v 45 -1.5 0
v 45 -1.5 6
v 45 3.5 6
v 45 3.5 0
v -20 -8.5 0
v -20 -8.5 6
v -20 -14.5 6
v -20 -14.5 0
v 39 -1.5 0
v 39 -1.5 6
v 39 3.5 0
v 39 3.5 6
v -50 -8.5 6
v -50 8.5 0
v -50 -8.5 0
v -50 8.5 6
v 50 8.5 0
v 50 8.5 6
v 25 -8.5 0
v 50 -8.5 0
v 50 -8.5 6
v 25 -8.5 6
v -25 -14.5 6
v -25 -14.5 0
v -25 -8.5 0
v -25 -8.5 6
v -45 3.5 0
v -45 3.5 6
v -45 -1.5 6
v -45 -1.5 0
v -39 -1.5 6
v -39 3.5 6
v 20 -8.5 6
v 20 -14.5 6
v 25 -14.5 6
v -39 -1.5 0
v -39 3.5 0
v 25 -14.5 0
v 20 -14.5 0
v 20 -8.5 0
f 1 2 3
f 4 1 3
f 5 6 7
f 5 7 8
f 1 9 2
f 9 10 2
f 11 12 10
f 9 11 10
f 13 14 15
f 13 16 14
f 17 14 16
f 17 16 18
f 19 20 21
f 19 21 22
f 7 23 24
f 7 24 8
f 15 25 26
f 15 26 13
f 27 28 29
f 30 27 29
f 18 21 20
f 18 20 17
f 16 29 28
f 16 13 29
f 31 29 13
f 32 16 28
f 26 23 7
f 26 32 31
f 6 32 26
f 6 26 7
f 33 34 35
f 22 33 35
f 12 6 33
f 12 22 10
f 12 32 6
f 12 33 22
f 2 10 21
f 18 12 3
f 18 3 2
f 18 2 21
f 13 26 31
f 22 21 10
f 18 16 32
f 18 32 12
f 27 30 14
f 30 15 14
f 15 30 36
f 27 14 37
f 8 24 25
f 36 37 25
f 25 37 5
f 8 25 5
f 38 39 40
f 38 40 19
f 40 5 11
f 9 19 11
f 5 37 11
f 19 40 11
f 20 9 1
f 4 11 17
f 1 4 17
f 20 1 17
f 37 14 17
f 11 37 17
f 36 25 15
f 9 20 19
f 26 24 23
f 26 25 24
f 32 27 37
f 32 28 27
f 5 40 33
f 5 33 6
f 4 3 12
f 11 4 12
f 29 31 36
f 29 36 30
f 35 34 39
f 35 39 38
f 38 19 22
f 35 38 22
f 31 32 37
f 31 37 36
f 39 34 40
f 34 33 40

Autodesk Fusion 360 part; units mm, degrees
sketch "Sketch1" plane through (0, 0, 0) normal (0, 0, 1) x (1, 0, 0)
  line L0 (-45, 8.5) -> (45, 8.5)
  line L1 (45, 8.5) -> (45, -8.5)
  line L2 (45, -8.5) -> (-45, -8.5)
  line L3 (-45, -8.5) -> (-45, 8.5)
  line L4 (-45, 8.5) -> (45, -8.5) construction
  line L5 (45, 8.5) -> (-45, -8.5) construction
  dimension "d1" = 90
  dimension "d2" = 17
extrude "Extrude1" add sketch "Sketch1" along normal blind 6
sketch "Sketch2" plane through (0, 0, 6) normal (0, 0, 1) x (-1, 0, 0)
  line L0 (45, 8.5) -> (-45, 8.5)
  line L1 (-45, 8.5) -> (-45, -8.5)
  line L2 (-45, -8.5) -> (45, -8.5)
  line L3 (45, -8.5) -> (45, 8.5)
  line L4 (45, -8.5) -> (39, -8.5) construction
  line L5 (39, -8.5) -> (39, -3.5) construction
  line L6 (39, -3.5) -> (45, -3.5) construction
  line L7 (45, -3.5) -> (45, -8.5) construction
  line L8 (-45, -8.5) -> (-39, -8.5) construction
  line L9 (-39, -8.5) -> (-39, -3.5) construction
  line L10 (-39, -3.5) -> (-45, -3.5) construction
  line L11 (-45, -3.5) -> (-45, -8.5) construction
  line L12 (45, -3.5) -> (39, -3.5)
  line L13 (39, -3.5) -> (39, 1.5)
  line L14 (39, 1.5) -> (45, 1.5)
  line L15 (45, 1.5) -> (45, -3.5)
  line L16 (-45, -3.5) -> (-39, -3.5)
  line L17 (-39, -3.5) -> (-39, 1.5)
  line L18 (-39, 1.5) -> (-45, 1.5)
  line L19 (-45, 1.5) -> (-45, -3.5)
  dimension "d5" = 6
  dimension "d6" = 5
  dimension "d7" = 6
  dimension "d8" = 5
  dimension "d9" = 5
  dimension "d10" = 5
extrude "Extrude2" cut sketch "Sketch2" against normal blind 9 contours L3 L12 L13 L14 L15 | L1 L16 L17 L18 L19
sketch "Sketch3" plane through (0, -8.5, 0) normal (0, -1, 0) x (1, 0, 0)
  line L0 (-45, 0) -> (45, 0)
  line L1 (45, 0) -> (45, 6)
  line L2 (45, 6) -> (-45, 6)
  line L3 (-45, 6) -> (-45, 0)
  line L4 (0, 6) -> (39, 6) construction
  line L5 (39, 0) -> (39, 6) construction
  line L6 (0, 6) -> (-39, 6) construction
  line L7 (-39, 6) -> (-39, 0) construction
  line L8 (0, 6) -> (0, 0)
  line L9 (0, 2.5249) -> (-20, 2.5249) construction
  line L10 (-20, 2.5249) -> (-20, 0) construction
  line L11 (0, 2.5249) -> (20, 2.5249) construction
  line L12 (-20, 0) -> (-25, 0)
  line L13 (-25, 0) -> (-25, 6)
  line L14 (-25, 6) -> (-20, 6)
  line L15 (-20, 6) -> (-20, 0)
  line L16 (20, 0) -> (25, 0)
  line L17 (25, 0) -> (25, 6)
  line L18 (25, 6) -> (20, 6)
  line L19 (20, 6) -> (20, 0)
extrude "Extrude3" add sketch "Sketch3" along normal blind 6 contours L0 L2 L12 L13 L14 L15 | L0 L2 L16 L17 L18 L19
sketch "Sketch4" plane through (-45, 0, 0) normal (-1, 0, 0) x (0, -1, 0)
  line L0 (-3.5, 0) -> (-3.5, 6)
  line L1 (-3.5, 6) -> (-8.5, 6)
  line L2 (-8.5, 6) -> (-8.5, 0)
  line L3 (-8.5, 0) -> (-3.5, 0)
  line L4 (-8.5, 6) -> (8.5, 6)
  line L5 (8.5, 6) -> (8.5, 0)
  line L6 (8.5, 0) -> (-8.5, 0)
  line L7 (-8.5, 0) -> (-8.5, 6)
  dimension "d15" = 17
  dimension "d16" = 6
extrude "Extrude4" add sketch "Sketch4" along normal blind 5
sketch "Sketch5" plane through (45, 0, 0) normal (1, 0, 0) x (0, 1, 0)
  line L0 (-1.5, 0) -> (-1.5, 6)
  line L1 (-1.5, 6) -> (-8.5, 6)
  line L2 (-8.5, 6) -> (-8.5, 0)
  line L3 (-8.5, 0) -> (-1.5, 0)
  line L4 (-8.5, 6) -> (8.5, 6)
  line L5 (8.5, 6) -> (8.5, 0)
  line L6 (8.5, 0) -> (-8.5, 0)
  line L7 (-8.5, 0) -> (-8.5, 6)
  dimension "d19" = 17
extrude "Extrude5" add sketch "Sketch5" along normal blind 5
